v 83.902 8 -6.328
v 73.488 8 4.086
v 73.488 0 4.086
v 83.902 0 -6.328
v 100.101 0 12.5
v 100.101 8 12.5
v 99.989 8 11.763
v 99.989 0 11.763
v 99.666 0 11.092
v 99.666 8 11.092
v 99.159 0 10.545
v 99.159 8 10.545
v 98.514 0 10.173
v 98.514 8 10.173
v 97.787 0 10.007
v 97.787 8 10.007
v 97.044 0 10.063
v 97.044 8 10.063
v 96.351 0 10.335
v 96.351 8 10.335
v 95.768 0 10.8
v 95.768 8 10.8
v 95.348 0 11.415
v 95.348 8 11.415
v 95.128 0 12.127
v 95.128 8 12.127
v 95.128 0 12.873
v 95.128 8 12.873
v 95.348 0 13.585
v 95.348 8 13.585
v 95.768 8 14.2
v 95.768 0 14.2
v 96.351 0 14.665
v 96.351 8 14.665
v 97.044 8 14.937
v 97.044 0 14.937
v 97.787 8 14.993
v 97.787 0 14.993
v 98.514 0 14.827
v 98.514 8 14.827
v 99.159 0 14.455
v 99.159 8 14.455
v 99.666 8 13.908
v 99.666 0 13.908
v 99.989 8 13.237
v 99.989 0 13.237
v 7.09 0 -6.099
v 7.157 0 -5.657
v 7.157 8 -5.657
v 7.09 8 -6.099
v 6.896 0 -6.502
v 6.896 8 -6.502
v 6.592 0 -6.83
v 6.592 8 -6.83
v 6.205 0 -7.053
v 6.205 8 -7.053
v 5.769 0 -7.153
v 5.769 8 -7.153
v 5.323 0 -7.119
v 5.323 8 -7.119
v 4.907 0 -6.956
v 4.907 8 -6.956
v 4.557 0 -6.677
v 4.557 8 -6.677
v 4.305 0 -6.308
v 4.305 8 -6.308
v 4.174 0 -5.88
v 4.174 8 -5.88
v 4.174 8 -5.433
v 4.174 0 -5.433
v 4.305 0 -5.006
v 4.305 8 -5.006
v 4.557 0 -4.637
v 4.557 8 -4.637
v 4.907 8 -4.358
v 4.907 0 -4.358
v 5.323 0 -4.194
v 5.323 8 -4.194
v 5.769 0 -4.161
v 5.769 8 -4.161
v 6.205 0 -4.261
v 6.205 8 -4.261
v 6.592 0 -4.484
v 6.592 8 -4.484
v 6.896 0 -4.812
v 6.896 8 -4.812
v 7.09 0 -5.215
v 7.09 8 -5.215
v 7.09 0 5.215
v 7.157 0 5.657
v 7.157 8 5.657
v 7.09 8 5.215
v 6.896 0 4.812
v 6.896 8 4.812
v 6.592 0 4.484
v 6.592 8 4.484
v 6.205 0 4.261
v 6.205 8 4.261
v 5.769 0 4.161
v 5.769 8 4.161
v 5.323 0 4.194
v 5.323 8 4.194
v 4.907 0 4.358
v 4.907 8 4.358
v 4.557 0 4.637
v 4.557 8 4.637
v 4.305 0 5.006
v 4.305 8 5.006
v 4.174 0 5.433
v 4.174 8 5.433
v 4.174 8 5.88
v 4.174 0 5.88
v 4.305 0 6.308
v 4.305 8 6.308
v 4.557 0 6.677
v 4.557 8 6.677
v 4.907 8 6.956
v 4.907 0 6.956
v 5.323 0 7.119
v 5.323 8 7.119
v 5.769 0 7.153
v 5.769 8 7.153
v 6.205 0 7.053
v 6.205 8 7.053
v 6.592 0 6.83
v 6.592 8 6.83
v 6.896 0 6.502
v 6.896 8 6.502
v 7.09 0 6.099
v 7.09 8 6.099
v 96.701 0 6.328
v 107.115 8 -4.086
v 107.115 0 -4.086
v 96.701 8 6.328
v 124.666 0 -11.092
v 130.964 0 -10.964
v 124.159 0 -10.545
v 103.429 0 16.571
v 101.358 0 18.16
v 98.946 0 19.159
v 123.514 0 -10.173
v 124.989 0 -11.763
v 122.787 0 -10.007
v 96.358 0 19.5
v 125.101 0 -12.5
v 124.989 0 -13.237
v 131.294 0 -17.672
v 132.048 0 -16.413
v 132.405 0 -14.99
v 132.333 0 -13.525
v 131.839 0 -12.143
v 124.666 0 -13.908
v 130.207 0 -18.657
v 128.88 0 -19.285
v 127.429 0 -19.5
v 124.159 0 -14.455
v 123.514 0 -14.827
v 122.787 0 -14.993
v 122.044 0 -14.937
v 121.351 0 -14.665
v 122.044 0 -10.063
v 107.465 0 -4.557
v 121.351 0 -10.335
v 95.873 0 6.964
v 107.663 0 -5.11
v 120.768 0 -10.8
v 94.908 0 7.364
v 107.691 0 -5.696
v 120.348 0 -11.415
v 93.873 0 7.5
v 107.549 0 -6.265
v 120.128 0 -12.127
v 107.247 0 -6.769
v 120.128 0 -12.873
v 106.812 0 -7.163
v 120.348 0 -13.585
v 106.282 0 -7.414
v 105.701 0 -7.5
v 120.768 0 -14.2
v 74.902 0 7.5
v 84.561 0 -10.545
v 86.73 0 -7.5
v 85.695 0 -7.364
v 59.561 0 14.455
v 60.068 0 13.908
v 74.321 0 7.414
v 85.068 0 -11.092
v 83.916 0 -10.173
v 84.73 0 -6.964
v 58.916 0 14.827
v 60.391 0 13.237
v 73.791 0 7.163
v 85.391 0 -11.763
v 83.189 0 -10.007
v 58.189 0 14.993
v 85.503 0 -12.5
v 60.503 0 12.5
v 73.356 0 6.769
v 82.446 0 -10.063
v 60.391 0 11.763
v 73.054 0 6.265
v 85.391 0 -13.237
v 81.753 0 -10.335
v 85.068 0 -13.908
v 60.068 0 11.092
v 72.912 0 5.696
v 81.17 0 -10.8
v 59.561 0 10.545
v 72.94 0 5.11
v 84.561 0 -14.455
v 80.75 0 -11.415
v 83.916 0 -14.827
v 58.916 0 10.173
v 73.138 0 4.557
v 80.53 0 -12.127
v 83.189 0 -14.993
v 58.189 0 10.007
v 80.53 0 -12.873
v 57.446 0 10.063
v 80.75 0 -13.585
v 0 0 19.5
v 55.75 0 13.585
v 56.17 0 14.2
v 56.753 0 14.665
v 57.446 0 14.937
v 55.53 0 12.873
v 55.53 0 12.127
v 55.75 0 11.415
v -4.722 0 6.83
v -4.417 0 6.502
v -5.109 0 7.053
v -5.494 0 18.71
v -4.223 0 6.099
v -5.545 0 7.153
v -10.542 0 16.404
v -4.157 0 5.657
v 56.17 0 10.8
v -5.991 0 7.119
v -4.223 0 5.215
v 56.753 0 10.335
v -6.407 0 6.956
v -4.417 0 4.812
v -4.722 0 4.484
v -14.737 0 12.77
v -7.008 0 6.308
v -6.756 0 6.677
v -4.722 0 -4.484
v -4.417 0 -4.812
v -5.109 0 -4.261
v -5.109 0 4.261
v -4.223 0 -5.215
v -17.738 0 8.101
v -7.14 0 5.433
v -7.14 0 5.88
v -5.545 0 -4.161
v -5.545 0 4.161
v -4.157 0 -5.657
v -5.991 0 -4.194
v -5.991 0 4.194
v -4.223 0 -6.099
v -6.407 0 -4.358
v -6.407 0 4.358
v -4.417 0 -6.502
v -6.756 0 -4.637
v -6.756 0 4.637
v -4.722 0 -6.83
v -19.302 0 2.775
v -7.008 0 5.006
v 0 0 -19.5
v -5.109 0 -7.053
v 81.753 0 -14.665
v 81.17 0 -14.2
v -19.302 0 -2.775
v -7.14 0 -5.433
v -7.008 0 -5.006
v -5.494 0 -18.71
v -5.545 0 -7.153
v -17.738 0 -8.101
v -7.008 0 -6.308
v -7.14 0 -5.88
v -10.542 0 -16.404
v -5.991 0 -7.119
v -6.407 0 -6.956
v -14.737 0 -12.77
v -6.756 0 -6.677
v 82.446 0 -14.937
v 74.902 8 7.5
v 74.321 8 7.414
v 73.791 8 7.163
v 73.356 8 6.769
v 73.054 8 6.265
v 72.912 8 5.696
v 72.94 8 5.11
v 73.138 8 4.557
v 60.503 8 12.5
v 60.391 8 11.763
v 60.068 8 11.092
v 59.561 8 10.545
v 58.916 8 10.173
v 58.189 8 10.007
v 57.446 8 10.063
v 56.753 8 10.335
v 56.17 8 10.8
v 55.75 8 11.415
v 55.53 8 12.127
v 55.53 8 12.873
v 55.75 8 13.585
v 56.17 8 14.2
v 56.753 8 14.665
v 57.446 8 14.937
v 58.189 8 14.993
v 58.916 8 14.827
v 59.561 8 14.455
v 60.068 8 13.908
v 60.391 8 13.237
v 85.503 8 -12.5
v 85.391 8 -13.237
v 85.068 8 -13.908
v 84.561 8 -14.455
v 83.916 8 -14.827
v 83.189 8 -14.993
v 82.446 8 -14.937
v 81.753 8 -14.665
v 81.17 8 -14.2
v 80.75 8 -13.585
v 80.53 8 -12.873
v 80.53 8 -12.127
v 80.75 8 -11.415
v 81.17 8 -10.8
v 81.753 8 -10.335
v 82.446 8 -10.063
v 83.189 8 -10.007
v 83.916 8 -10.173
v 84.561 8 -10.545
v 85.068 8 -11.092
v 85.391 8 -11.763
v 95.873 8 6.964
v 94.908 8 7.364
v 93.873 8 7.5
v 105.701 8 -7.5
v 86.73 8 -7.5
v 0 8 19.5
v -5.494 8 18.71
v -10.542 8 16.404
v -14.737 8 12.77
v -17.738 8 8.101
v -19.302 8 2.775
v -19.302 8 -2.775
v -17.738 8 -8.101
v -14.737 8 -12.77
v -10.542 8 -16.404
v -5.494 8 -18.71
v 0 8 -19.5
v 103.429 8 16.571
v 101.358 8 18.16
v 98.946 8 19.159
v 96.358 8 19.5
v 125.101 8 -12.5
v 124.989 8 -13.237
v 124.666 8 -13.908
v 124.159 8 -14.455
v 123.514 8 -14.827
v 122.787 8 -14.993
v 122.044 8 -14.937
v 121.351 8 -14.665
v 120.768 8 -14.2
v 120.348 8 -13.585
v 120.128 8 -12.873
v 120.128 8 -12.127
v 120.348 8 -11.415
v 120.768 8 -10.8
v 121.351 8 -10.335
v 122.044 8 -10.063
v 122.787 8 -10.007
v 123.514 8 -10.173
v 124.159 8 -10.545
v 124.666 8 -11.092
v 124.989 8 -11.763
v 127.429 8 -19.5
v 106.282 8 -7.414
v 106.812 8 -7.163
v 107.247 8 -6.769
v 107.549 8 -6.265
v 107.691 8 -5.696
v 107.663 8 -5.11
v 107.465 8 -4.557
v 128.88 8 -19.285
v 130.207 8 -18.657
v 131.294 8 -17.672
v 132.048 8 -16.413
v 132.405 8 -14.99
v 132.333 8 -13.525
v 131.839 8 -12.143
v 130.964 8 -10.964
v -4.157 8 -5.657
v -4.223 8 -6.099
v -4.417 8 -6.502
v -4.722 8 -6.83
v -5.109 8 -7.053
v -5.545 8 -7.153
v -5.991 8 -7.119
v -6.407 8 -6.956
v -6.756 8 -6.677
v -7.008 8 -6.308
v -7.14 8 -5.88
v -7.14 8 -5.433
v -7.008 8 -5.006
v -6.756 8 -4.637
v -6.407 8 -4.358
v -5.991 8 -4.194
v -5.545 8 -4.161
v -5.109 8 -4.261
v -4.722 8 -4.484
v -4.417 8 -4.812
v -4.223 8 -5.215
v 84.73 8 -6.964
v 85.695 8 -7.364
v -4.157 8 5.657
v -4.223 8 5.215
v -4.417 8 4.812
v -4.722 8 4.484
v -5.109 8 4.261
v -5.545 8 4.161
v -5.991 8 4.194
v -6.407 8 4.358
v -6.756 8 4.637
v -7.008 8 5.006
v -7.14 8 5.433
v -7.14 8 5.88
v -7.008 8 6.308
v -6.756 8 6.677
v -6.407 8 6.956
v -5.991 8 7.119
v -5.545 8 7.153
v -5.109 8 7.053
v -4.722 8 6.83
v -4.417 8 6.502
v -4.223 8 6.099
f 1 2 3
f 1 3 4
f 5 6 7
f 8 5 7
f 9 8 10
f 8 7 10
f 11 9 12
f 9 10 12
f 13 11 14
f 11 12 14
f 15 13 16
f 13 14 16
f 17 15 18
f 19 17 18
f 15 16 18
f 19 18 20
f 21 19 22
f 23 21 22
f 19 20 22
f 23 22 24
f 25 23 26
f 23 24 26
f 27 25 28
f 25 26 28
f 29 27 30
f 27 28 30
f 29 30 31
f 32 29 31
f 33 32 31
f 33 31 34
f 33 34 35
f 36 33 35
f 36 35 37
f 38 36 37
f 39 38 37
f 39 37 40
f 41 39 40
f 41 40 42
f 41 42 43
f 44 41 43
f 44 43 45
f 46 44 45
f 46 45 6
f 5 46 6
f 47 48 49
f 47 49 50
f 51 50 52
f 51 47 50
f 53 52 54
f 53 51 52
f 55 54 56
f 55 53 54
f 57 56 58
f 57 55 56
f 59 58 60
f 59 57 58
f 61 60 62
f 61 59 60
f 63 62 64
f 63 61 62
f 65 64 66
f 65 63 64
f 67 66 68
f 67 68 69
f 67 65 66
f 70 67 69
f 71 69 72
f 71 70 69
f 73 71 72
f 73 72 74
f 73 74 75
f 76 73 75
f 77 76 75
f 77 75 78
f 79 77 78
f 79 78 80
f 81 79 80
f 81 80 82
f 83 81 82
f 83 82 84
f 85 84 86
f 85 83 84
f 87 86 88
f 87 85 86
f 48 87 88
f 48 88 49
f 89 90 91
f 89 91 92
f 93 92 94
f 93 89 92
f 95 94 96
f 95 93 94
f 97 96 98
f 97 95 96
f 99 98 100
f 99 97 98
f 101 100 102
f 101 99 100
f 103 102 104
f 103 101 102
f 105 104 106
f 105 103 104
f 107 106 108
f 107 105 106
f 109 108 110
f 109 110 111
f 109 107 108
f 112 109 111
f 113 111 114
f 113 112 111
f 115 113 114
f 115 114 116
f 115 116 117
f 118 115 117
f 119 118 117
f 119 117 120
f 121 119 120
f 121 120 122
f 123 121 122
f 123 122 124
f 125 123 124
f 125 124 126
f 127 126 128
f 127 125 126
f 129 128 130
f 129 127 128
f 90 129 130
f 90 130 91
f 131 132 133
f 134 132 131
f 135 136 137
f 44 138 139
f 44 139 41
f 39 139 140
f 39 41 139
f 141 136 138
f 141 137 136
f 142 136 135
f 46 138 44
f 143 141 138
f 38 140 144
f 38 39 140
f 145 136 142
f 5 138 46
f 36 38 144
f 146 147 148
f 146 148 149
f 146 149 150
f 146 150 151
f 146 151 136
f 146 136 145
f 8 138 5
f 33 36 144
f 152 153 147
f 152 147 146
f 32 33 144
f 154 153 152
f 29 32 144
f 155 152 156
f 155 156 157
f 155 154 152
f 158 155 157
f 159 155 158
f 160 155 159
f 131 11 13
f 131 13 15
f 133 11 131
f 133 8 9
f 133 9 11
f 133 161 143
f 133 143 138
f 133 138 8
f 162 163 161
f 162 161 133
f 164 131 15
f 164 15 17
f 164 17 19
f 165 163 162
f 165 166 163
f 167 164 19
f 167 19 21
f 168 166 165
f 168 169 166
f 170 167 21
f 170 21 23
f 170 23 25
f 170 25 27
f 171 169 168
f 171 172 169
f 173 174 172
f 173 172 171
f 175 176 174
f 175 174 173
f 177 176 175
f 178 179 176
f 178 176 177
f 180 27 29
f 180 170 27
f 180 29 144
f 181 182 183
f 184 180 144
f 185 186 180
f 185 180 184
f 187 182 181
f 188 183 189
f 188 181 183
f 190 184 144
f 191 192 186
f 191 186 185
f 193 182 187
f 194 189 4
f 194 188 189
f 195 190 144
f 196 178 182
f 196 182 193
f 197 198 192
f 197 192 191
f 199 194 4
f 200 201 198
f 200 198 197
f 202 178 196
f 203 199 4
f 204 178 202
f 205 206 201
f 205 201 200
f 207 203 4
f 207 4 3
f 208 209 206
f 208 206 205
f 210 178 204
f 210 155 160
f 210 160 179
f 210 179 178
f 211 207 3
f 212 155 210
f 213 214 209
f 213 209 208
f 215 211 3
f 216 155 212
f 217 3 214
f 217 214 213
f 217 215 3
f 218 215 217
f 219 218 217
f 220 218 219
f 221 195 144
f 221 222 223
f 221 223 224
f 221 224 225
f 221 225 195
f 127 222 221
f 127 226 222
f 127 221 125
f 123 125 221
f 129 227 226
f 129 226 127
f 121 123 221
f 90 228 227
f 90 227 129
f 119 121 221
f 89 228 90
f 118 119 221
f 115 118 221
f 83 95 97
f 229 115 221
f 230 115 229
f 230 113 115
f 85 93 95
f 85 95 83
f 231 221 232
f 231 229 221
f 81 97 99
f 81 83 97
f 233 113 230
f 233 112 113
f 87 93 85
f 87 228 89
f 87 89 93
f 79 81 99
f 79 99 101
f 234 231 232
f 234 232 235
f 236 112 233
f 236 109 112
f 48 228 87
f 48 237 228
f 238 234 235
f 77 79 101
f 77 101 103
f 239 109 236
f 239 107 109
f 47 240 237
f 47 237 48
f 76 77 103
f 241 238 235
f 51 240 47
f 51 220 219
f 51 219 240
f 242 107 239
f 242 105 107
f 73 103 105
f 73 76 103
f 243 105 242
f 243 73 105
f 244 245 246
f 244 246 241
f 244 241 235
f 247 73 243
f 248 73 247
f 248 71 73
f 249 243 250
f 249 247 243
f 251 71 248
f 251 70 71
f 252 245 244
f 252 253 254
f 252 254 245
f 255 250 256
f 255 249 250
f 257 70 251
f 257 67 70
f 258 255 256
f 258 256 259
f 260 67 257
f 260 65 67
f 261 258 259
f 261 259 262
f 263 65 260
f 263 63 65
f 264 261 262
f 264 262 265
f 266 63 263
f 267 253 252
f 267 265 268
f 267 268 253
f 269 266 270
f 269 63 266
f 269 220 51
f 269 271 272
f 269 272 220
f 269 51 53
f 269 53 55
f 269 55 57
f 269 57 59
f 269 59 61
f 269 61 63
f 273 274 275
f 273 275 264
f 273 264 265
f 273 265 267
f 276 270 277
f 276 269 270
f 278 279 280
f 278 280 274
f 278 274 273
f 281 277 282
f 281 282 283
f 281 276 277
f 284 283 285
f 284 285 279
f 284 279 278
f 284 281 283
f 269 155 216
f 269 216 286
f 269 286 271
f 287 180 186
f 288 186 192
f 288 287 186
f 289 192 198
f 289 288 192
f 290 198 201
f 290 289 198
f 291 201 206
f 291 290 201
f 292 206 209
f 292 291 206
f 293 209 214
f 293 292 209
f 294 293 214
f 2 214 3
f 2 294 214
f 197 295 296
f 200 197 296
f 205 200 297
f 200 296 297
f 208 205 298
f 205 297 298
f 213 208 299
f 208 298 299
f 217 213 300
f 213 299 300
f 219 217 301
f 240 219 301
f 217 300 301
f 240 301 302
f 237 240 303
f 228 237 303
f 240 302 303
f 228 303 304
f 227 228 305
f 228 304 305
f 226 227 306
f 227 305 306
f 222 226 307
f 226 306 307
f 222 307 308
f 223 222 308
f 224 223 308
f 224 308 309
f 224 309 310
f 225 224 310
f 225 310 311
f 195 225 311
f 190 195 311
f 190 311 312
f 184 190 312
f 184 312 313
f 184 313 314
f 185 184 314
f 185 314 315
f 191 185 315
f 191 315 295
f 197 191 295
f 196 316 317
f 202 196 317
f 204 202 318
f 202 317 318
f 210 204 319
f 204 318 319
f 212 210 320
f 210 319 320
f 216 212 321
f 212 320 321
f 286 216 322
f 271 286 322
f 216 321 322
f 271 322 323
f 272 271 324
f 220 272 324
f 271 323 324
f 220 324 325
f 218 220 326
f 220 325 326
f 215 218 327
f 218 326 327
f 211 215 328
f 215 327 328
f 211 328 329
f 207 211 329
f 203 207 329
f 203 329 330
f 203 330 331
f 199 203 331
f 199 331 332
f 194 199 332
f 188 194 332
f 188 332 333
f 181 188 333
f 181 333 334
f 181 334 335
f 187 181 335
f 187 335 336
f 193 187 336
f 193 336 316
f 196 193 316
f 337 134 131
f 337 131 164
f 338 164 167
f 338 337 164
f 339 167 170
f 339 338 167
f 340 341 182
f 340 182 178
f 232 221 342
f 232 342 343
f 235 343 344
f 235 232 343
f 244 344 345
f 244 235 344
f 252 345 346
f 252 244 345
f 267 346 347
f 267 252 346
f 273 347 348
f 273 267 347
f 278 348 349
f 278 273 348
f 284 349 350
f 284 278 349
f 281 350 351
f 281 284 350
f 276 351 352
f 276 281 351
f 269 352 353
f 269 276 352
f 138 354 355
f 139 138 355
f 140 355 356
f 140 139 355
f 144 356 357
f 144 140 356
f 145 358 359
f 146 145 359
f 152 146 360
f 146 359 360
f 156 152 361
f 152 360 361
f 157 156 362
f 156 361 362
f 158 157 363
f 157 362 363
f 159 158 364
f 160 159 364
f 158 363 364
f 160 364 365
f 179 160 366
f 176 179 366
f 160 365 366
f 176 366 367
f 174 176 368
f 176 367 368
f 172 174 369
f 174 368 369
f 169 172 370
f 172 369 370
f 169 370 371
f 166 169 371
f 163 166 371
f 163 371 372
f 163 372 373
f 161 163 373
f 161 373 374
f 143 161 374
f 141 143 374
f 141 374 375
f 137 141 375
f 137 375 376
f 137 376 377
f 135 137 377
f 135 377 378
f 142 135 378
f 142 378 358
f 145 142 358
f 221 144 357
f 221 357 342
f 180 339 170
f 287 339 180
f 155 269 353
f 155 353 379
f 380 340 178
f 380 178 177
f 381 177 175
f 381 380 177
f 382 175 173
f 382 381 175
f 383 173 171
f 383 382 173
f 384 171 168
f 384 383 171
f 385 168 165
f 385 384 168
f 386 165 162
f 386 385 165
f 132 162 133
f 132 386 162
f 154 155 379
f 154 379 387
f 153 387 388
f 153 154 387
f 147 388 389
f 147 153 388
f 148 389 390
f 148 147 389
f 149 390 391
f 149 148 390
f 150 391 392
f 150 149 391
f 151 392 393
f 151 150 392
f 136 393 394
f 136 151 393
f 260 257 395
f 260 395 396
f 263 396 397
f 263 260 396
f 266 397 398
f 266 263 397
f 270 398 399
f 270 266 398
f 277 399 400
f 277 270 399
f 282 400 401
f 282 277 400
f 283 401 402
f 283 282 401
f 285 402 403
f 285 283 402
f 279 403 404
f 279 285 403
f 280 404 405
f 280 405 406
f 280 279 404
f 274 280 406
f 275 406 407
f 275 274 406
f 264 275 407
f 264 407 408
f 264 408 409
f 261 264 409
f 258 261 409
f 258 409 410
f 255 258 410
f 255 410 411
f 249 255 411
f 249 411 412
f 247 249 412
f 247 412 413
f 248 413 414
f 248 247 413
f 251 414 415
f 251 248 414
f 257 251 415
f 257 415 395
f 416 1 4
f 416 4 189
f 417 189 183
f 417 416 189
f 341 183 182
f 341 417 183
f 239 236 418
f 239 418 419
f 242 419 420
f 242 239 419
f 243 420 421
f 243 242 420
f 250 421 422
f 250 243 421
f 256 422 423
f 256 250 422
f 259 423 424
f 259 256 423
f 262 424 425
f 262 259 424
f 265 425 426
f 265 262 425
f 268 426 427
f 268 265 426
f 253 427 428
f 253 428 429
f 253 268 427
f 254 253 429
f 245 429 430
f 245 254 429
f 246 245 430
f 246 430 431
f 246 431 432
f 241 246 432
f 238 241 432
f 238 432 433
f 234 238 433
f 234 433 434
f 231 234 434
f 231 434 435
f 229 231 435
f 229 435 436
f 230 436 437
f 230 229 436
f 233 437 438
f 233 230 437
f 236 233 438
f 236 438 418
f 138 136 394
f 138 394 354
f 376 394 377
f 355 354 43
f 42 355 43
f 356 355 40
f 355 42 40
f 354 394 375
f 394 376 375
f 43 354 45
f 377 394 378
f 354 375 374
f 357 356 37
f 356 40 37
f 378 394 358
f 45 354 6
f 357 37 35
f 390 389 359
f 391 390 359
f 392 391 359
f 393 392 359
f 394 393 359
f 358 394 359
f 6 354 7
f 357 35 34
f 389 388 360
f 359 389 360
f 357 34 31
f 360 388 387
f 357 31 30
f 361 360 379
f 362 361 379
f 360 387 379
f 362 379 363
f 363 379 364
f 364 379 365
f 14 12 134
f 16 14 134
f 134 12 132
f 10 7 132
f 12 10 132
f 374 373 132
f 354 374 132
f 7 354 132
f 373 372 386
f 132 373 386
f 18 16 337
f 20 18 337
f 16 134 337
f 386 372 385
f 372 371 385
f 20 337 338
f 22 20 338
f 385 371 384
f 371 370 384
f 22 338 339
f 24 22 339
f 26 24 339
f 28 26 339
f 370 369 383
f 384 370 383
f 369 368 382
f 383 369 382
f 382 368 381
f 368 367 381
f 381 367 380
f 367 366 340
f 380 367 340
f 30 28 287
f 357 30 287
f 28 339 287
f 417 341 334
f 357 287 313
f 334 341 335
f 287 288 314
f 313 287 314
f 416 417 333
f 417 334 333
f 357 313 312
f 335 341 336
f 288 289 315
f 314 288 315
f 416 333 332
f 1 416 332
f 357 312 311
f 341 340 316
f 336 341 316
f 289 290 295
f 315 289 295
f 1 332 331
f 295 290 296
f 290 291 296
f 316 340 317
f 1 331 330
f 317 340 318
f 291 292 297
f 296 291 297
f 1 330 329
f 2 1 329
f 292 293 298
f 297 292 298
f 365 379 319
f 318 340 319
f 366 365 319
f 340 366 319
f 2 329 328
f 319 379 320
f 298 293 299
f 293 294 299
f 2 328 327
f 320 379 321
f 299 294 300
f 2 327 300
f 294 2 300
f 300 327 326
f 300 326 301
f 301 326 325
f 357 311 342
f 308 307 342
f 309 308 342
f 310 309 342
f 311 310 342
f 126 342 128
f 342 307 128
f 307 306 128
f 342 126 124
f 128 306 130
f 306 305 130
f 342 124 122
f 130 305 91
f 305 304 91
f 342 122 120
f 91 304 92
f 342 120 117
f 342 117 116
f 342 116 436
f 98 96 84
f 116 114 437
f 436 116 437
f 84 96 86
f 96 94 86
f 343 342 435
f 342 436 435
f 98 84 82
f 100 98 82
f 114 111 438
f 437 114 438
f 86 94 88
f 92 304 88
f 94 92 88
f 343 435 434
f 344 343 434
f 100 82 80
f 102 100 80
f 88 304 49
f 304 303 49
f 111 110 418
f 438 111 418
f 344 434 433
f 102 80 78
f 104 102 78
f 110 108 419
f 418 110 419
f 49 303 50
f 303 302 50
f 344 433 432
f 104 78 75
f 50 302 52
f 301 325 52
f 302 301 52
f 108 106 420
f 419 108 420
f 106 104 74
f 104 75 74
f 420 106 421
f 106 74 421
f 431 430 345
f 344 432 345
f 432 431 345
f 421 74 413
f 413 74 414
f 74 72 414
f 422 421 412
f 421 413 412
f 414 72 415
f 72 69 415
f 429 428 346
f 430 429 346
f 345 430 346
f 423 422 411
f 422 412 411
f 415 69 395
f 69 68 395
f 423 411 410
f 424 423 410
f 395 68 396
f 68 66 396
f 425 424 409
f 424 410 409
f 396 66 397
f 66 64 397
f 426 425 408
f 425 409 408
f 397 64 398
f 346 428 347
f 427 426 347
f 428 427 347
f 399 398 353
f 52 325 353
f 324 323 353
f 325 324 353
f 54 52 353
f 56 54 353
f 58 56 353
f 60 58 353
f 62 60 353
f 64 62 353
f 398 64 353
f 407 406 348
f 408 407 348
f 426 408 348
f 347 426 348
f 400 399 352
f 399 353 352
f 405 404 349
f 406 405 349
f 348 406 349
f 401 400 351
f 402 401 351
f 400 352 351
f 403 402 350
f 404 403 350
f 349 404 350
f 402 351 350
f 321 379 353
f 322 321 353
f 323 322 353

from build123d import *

# Parameters (mm, degrees)
SKETCH_1_R               = 1.5
EXTRUDE_1_DEPTH          = 8
CUT_EXTRUDE_1_DEPTH      = 1
CUT_EXTRUDE_1_DEPTH_BACK = 9
SKETCH_3_R               = 2.5
CUT_EXTRUDE_2_DEPTH      = 1
CUT_EXTRUDE_2_DEPTH_BACK = 9


with BuildPart() as part:
    # 草图1 → 凸台-拉伸1 (new body)
    with BuildSketch(Plane(origin=(0, 0, 0), x_dir=(1, 0, 0), z_dir=(0, 1, 0))):
        with BuildLine():
            Line((0, 19.5), (127.428932188, 19.5))
            ThreePointArc((127.428932188, 19.5), (132.048329851, 16.413417162), (130.964466094, 10.964466094))
            Line((130.964466094, 10.964466094), (103.428932188, -16.571067812))
            ThreePointArc((103.428932188, -16.571067812), (100.1846987, -18.738795325), (96.357864376, -19.5))
            Line((96.357864376, -19.5), (0, -19.5))
            ThreePointArc((0, -19.5), (-19.5, 0), (0, 19.5))
        make_face()
        with Locations((-5.656854249, 5.656854249)):
            Circle(SKETCH_1_R, mode=Mode.SUBTRACT)
        with Locations((5.656854249, 5.656854249)):
            Circle(SKETCH_1_R, mode=Mode.SUBTRACT)
        with Locations((5.656854249, -5.656854249)):
            Circle(SKETCH_1_R, mode=Mode.SUBTRACT)
        with Locations((-5.656854249, -5.656854249)):
            Circle(SKETCH_1_R, mode=Mode.SUBTRACT)
    extrude(amount=EXTRUDE_1_DEPTH)

    # 草图2 → 切除-拉伸1 (cut, two sides)
    with BuildSketch(Plane(origin=(0, 8, 0), x_dir=(1, 0, 0), z_dir=(0, 1, 0))) as cut_extrude_1_sk:
        with BuildLine():
            Line((73.487806691, -4.085786438), (83.902020254, 6.328427125))
            ThreePointArc((83.902020254, 6.328427125), (85.199713649, 7.19551813), (86.730447378, 7.5))
            Line((86.730447378, 7.5), (105.701010127, 7.5))
            ThreePointArc((105.701010127, 7.5), (107.548769192, 6.265366865), (107.115223689, 4.085786438))
            Line((107.115223689, 4.085786438), (96.701010127, -6.328427125))
            ThreePointArc((96.701010127, -6.328427125), (95.403316732, -7.19551813), (93.872583002, -7.5))
            Line((93.872583002, -7.5), (74.902020254, -7.5))
            ThreePointArc((74.902020254, -7.5), (73.054261189, -6.265366865), (73.487806691, -4.085786438))
        make_face()
    extrude(amount=CUT_EXTRUDE_1_DEPTH, mode=Mode.SUBTRACT)
    extrude(cut_extrude_1_sk.sketch, amount=-CUT_EXTRUDE_1_DEPTH_BACK, mode=Mode.SUBTRACT)

    # 草图3 → 切除-拉伸2 (cut, two sides)
    with BuildSketch(Plane(origin=(0, 8, 0), x_dir=(1, 0, 0), z_dir=(0, 1, 0))) as cut_extrude_2_sk:
        with Locations((58.002525317, -12.5)):
            Circle(SKETCH_3_R)
        with Locations((83.002525317, 12.5)):
            Circle(SKETCH_3_R)
        with Locations((97.600505063, -12.5)):
            Circle(SKETCH_3_R)
        with Locations((122.600505063, 12.5)):
            Circle(SKETCH_3_R)
    extrude(amount=CUT_EXTRUDE_2_DEPTH, mode=Mode.SUBTRACT)
    extrude(cut_extrude_2_sk.sketch, amount=-CUT_EXTRUDE_2_DEPTH_BACK, mode=Mode.SUBTRACT)


solid = part.part
